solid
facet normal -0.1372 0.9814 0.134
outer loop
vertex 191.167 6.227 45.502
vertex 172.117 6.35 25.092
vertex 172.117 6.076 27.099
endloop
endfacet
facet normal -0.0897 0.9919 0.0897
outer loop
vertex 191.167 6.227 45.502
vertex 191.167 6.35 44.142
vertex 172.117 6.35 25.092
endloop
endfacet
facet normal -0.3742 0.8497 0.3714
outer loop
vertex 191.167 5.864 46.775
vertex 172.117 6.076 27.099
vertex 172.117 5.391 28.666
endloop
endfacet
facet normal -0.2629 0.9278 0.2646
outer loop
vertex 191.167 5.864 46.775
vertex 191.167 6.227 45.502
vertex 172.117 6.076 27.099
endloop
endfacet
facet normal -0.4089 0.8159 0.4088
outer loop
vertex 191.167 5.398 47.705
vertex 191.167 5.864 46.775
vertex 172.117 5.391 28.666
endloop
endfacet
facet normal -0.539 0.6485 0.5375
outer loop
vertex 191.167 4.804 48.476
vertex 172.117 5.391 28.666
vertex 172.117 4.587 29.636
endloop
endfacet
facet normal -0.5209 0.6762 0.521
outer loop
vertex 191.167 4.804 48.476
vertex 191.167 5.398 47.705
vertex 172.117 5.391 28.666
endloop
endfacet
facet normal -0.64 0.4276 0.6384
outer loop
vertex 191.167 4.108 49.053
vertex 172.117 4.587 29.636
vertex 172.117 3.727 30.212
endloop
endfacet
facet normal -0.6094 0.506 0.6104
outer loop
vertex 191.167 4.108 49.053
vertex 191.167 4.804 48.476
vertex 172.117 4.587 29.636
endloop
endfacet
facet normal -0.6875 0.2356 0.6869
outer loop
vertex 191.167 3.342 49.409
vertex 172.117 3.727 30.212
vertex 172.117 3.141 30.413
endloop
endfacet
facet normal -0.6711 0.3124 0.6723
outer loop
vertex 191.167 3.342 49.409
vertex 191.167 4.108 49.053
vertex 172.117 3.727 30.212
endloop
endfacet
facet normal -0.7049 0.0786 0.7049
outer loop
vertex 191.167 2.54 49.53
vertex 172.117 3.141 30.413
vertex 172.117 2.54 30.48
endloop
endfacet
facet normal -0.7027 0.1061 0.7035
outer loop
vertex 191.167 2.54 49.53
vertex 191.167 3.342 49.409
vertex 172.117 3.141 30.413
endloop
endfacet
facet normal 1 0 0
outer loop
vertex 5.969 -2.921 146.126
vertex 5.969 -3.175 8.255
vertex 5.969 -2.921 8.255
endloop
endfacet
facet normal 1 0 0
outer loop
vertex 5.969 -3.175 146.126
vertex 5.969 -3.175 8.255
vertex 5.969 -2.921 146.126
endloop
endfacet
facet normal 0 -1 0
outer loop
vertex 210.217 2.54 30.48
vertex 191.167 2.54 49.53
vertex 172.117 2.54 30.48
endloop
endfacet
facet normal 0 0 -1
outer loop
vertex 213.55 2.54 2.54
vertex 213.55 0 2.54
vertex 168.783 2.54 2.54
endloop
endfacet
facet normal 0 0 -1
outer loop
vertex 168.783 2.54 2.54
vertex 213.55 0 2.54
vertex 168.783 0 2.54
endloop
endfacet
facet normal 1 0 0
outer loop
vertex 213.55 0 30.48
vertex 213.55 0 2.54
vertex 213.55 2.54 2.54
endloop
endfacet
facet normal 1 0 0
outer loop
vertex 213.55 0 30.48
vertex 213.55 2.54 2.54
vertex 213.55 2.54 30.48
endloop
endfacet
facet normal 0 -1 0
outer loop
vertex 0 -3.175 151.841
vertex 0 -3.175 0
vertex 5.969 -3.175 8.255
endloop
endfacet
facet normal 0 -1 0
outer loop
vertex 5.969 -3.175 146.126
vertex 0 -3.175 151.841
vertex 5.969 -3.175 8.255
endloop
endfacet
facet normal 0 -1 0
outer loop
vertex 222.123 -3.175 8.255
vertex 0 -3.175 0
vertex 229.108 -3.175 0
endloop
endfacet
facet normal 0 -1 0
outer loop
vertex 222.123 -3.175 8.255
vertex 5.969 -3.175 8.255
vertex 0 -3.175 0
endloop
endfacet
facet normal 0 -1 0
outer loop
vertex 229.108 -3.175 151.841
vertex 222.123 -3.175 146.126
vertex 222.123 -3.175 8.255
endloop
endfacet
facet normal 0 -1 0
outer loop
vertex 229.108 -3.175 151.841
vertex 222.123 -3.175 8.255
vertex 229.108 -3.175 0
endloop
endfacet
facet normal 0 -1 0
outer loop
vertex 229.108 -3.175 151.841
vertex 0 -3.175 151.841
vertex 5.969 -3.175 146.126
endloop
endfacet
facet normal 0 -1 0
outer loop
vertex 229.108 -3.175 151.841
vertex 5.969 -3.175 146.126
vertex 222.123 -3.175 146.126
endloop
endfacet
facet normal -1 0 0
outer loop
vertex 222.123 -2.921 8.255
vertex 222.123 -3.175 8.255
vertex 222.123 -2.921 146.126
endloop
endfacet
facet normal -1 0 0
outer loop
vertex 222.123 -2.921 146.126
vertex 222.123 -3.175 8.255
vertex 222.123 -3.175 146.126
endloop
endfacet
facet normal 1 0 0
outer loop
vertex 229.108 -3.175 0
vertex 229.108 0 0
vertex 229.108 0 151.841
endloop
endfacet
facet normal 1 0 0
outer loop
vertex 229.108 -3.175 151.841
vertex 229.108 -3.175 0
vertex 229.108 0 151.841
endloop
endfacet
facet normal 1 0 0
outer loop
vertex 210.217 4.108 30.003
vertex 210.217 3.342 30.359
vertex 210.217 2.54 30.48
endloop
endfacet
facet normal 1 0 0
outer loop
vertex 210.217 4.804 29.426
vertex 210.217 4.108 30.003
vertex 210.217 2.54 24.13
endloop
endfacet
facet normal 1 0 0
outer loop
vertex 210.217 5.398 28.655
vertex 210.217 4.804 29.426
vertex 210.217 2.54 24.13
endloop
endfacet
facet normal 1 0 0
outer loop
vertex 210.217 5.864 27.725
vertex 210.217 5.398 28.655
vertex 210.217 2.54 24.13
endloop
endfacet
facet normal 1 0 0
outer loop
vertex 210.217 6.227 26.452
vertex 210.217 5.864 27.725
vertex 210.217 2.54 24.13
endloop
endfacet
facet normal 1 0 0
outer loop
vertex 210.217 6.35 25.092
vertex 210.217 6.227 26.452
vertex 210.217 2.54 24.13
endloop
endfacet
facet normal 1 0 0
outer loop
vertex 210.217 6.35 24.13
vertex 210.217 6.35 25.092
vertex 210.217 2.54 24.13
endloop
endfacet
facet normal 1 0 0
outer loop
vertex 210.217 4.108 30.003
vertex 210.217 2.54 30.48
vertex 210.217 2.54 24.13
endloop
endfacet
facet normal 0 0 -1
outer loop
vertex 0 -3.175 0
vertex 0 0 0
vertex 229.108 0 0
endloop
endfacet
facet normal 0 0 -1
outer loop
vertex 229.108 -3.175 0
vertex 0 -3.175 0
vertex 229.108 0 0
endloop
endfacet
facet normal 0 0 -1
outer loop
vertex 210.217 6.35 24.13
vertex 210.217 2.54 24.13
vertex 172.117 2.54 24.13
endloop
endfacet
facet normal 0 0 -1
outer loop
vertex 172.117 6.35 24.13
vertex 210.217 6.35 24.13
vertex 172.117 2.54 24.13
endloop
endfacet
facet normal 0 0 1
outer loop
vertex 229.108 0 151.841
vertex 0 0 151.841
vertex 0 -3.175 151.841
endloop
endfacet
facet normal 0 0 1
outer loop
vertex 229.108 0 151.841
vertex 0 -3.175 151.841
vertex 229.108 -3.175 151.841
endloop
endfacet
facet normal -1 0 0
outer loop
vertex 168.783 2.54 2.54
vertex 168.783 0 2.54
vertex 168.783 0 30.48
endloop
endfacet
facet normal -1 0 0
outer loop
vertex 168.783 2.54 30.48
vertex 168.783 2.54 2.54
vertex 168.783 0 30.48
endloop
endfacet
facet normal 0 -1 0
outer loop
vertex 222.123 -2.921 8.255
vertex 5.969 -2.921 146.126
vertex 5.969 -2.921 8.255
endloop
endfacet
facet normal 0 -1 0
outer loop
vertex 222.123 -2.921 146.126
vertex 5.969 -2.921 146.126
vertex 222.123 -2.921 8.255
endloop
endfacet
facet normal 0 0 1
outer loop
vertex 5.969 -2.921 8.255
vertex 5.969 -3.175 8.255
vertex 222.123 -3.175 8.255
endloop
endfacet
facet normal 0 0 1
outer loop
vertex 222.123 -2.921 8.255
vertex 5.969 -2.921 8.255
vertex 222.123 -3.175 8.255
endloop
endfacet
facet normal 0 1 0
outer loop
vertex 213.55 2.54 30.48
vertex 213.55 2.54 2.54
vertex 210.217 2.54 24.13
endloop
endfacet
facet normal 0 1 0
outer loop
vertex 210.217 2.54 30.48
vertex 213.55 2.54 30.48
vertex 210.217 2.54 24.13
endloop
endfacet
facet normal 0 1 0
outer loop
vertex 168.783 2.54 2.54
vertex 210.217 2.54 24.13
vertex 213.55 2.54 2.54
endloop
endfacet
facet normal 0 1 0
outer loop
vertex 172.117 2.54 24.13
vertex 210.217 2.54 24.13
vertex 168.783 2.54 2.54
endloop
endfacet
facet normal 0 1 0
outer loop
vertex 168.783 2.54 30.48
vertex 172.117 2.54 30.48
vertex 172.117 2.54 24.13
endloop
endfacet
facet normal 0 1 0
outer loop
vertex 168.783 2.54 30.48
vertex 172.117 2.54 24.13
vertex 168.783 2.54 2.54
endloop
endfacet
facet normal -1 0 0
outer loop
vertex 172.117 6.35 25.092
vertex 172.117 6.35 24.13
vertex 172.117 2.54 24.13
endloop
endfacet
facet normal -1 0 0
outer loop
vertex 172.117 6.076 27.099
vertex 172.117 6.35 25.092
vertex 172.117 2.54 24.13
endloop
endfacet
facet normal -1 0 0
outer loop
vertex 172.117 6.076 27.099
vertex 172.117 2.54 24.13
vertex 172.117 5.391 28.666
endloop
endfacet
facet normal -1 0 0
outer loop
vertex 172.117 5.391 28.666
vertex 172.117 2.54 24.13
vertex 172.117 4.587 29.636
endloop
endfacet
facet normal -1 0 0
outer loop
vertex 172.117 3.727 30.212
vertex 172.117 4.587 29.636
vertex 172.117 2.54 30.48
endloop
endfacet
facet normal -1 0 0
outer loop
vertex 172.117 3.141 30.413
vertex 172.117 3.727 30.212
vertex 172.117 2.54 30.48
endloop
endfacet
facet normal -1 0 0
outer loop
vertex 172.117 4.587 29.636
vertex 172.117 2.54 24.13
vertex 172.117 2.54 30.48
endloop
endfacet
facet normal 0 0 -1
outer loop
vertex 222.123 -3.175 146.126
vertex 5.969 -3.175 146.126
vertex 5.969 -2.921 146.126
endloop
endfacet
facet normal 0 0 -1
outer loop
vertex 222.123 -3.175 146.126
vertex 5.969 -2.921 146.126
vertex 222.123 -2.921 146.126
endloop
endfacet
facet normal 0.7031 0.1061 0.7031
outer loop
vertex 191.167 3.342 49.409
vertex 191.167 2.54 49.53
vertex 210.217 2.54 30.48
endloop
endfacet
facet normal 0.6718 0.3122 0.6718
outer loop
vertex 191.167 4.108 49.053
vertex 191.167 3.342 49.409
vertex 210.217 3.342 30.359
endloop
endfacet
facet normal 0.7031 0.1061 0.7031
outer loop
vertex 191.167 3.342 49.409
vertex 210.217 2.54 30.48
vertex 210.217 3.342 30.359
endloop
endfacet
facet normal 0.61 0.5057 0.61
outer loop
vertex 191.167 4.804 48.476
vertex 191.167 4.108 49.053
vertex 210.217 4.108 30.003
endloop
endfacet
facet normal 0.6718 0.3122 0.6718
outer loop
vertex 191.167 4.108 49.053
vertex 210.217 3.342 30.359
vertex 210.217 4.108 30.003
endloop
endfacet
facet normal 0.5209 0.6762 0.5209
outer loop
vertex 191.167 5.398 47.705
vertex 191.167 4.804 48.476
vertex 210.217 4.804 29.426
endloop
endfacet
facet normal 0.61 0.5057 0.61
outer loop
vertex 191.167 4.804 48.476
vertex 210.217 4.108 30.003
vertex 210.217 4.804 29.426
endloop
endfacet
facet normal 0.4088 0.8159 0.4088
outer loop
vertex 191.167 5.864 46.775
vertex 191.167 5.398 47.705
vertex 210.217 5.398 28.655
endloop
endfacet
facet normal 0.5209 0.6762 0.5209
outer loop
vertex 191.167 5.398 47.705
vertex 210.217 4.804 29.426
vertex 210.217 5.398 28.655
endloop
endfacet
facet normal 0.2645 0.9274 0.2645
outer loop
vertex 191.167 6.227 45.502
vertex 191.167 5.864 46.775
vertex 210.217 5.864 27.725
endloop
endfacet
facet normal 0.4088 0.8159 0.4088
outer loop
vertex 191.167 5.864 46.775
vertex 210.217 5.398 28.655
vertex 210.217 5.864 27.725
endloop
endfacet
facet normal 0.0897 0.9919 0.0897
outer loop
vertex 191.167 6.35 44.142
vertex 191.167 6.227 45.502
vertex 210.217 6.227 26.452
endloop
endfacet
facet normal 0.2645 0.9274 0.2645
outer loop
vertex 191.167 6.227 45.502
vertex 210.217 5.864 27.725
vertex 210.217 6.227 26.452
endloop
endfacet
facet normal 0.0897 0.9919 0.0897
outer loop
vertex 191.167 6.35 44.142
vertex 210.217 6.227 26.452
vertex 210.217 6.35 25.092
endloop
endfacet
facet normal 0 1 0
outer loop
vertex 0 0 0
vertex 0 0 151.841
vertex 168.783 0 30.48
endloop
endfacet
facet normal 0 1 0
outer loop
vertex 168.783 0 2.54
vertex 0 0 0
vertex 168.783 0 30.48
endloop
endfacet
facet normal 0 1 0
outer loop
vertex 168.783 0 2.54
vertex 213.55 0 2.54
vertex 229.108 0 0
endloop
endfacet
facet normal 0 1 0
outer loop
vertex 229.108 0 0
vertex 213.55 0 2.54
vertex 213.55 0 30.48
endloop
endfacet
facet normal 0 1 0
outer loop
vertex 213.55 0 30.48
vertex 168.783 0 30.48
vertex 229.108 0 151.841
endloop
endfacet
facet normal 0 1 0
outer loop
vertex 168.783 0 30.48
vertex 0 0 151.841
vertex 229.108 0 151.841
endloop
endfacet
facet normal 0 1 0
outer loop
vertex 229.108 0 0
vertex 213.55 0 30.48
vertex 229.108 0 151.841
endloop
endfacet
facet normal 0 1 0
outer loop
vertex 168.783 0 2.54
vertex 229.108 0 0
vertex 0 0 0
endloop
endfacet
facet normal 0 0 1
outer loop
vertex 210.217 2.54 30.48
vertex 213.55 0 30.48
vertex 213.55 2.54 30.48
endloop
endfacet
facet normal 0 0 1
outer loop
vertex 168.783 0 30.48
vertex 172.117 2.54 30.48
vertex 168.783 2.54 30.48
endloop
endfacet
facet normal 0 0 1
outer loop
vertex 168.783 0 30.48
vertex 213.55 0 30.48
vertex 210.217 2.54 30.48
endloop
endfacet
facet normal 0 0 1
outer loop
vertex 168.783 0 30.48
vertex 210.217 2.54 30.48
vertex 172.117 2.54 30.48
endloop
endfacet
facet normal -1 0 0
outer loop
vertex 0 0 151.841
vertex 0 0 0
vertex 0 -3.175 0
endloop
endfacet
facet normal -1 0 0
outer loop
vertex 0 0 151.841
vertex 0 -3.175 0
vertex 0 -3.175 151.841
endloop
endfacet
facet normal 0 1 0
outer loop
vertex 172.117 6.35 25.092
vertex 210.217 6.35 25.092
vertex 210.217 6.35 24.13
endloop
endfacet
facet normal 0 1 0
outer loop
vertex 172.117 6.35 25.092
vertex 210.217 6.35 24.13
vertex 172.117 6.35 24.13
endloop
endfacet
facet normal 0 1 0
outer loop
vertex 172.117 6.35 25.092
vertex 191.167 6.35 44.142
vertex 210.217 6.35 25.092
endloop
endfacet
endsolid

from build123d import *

# Parameters (mm, degrees)
F0_W     = 229.108
F0_H     = 151.8412
F1_DEPTH = 3.175
F2_W     = 216.154
F2_H     = 137.8712
F3_DEPTH = 0.254
F4_W     = 44.7675
F4_H     = 27.94
F5_DEPTH = 2.54
F7_DEPTH = 3.81
F8_R     = 3.80999


# Not quite as in the source:
# - a fillet or chamfer is up to 0.001 mm smaller than in the source, because OpenCascade refuses the exact size


with BuildPart() as f1:
    # F0 (on Front) → F1 (new body)
    with BuildSketch(Plane.XZ):
        with Locations((114.554, 75.9206)):
            Rectangle(F0_W, F0_H)
    extrude(amount=F1_DEPTH)

    # F2 (on face) → F3 (cut)
    with BuildSketch(Plane.XZ.offset(3.175)):
        with Locations((114.046, 77.1906)):
            Rectangle(F2_W, F2_H)
    extrude(amount=-F3_DEPTH, mode=Mode.SUBTRACT)

    # F4 (on face) → F5 (join)
    with BuildSketch(Plane(origin=(0, 0, 0), x_dir=(-1, 0, 0), z_dir=(0, 1, 0))):
        with Locations((-191.16675, 16.51)):
            Rectangle(F4_W, F4_H)
    extrude(amount=F5_DEPTH)

    # F6 (on face) → F7 (join)
    with BuildSketch(Plane(origin=(0, 2.54, 0), x_dir=(-1, 0, 0), z_dir=(0, 1, 0))):
        Polygon((-210.21675, 30.48), (-210.21675, 24.13), (-172.11675, 24.13), (-172.11675, 30.48), (-191.16675, 49.53), align=None)
    extrude(amount=F7_DEPTH)

    # F8 (radius 3.81 in the source; OpenCascade refuses exactly that, so slightly less here)
    f8_edges = [f1.edges().sort_by_distance(p)[0] for p in [
        (200.69175, 6.35, 40.005),
        (181.64175, 6.35, 40.005),
    ]]
    fillet(f8_edges, radius=F8_R)


solid = f1.part
